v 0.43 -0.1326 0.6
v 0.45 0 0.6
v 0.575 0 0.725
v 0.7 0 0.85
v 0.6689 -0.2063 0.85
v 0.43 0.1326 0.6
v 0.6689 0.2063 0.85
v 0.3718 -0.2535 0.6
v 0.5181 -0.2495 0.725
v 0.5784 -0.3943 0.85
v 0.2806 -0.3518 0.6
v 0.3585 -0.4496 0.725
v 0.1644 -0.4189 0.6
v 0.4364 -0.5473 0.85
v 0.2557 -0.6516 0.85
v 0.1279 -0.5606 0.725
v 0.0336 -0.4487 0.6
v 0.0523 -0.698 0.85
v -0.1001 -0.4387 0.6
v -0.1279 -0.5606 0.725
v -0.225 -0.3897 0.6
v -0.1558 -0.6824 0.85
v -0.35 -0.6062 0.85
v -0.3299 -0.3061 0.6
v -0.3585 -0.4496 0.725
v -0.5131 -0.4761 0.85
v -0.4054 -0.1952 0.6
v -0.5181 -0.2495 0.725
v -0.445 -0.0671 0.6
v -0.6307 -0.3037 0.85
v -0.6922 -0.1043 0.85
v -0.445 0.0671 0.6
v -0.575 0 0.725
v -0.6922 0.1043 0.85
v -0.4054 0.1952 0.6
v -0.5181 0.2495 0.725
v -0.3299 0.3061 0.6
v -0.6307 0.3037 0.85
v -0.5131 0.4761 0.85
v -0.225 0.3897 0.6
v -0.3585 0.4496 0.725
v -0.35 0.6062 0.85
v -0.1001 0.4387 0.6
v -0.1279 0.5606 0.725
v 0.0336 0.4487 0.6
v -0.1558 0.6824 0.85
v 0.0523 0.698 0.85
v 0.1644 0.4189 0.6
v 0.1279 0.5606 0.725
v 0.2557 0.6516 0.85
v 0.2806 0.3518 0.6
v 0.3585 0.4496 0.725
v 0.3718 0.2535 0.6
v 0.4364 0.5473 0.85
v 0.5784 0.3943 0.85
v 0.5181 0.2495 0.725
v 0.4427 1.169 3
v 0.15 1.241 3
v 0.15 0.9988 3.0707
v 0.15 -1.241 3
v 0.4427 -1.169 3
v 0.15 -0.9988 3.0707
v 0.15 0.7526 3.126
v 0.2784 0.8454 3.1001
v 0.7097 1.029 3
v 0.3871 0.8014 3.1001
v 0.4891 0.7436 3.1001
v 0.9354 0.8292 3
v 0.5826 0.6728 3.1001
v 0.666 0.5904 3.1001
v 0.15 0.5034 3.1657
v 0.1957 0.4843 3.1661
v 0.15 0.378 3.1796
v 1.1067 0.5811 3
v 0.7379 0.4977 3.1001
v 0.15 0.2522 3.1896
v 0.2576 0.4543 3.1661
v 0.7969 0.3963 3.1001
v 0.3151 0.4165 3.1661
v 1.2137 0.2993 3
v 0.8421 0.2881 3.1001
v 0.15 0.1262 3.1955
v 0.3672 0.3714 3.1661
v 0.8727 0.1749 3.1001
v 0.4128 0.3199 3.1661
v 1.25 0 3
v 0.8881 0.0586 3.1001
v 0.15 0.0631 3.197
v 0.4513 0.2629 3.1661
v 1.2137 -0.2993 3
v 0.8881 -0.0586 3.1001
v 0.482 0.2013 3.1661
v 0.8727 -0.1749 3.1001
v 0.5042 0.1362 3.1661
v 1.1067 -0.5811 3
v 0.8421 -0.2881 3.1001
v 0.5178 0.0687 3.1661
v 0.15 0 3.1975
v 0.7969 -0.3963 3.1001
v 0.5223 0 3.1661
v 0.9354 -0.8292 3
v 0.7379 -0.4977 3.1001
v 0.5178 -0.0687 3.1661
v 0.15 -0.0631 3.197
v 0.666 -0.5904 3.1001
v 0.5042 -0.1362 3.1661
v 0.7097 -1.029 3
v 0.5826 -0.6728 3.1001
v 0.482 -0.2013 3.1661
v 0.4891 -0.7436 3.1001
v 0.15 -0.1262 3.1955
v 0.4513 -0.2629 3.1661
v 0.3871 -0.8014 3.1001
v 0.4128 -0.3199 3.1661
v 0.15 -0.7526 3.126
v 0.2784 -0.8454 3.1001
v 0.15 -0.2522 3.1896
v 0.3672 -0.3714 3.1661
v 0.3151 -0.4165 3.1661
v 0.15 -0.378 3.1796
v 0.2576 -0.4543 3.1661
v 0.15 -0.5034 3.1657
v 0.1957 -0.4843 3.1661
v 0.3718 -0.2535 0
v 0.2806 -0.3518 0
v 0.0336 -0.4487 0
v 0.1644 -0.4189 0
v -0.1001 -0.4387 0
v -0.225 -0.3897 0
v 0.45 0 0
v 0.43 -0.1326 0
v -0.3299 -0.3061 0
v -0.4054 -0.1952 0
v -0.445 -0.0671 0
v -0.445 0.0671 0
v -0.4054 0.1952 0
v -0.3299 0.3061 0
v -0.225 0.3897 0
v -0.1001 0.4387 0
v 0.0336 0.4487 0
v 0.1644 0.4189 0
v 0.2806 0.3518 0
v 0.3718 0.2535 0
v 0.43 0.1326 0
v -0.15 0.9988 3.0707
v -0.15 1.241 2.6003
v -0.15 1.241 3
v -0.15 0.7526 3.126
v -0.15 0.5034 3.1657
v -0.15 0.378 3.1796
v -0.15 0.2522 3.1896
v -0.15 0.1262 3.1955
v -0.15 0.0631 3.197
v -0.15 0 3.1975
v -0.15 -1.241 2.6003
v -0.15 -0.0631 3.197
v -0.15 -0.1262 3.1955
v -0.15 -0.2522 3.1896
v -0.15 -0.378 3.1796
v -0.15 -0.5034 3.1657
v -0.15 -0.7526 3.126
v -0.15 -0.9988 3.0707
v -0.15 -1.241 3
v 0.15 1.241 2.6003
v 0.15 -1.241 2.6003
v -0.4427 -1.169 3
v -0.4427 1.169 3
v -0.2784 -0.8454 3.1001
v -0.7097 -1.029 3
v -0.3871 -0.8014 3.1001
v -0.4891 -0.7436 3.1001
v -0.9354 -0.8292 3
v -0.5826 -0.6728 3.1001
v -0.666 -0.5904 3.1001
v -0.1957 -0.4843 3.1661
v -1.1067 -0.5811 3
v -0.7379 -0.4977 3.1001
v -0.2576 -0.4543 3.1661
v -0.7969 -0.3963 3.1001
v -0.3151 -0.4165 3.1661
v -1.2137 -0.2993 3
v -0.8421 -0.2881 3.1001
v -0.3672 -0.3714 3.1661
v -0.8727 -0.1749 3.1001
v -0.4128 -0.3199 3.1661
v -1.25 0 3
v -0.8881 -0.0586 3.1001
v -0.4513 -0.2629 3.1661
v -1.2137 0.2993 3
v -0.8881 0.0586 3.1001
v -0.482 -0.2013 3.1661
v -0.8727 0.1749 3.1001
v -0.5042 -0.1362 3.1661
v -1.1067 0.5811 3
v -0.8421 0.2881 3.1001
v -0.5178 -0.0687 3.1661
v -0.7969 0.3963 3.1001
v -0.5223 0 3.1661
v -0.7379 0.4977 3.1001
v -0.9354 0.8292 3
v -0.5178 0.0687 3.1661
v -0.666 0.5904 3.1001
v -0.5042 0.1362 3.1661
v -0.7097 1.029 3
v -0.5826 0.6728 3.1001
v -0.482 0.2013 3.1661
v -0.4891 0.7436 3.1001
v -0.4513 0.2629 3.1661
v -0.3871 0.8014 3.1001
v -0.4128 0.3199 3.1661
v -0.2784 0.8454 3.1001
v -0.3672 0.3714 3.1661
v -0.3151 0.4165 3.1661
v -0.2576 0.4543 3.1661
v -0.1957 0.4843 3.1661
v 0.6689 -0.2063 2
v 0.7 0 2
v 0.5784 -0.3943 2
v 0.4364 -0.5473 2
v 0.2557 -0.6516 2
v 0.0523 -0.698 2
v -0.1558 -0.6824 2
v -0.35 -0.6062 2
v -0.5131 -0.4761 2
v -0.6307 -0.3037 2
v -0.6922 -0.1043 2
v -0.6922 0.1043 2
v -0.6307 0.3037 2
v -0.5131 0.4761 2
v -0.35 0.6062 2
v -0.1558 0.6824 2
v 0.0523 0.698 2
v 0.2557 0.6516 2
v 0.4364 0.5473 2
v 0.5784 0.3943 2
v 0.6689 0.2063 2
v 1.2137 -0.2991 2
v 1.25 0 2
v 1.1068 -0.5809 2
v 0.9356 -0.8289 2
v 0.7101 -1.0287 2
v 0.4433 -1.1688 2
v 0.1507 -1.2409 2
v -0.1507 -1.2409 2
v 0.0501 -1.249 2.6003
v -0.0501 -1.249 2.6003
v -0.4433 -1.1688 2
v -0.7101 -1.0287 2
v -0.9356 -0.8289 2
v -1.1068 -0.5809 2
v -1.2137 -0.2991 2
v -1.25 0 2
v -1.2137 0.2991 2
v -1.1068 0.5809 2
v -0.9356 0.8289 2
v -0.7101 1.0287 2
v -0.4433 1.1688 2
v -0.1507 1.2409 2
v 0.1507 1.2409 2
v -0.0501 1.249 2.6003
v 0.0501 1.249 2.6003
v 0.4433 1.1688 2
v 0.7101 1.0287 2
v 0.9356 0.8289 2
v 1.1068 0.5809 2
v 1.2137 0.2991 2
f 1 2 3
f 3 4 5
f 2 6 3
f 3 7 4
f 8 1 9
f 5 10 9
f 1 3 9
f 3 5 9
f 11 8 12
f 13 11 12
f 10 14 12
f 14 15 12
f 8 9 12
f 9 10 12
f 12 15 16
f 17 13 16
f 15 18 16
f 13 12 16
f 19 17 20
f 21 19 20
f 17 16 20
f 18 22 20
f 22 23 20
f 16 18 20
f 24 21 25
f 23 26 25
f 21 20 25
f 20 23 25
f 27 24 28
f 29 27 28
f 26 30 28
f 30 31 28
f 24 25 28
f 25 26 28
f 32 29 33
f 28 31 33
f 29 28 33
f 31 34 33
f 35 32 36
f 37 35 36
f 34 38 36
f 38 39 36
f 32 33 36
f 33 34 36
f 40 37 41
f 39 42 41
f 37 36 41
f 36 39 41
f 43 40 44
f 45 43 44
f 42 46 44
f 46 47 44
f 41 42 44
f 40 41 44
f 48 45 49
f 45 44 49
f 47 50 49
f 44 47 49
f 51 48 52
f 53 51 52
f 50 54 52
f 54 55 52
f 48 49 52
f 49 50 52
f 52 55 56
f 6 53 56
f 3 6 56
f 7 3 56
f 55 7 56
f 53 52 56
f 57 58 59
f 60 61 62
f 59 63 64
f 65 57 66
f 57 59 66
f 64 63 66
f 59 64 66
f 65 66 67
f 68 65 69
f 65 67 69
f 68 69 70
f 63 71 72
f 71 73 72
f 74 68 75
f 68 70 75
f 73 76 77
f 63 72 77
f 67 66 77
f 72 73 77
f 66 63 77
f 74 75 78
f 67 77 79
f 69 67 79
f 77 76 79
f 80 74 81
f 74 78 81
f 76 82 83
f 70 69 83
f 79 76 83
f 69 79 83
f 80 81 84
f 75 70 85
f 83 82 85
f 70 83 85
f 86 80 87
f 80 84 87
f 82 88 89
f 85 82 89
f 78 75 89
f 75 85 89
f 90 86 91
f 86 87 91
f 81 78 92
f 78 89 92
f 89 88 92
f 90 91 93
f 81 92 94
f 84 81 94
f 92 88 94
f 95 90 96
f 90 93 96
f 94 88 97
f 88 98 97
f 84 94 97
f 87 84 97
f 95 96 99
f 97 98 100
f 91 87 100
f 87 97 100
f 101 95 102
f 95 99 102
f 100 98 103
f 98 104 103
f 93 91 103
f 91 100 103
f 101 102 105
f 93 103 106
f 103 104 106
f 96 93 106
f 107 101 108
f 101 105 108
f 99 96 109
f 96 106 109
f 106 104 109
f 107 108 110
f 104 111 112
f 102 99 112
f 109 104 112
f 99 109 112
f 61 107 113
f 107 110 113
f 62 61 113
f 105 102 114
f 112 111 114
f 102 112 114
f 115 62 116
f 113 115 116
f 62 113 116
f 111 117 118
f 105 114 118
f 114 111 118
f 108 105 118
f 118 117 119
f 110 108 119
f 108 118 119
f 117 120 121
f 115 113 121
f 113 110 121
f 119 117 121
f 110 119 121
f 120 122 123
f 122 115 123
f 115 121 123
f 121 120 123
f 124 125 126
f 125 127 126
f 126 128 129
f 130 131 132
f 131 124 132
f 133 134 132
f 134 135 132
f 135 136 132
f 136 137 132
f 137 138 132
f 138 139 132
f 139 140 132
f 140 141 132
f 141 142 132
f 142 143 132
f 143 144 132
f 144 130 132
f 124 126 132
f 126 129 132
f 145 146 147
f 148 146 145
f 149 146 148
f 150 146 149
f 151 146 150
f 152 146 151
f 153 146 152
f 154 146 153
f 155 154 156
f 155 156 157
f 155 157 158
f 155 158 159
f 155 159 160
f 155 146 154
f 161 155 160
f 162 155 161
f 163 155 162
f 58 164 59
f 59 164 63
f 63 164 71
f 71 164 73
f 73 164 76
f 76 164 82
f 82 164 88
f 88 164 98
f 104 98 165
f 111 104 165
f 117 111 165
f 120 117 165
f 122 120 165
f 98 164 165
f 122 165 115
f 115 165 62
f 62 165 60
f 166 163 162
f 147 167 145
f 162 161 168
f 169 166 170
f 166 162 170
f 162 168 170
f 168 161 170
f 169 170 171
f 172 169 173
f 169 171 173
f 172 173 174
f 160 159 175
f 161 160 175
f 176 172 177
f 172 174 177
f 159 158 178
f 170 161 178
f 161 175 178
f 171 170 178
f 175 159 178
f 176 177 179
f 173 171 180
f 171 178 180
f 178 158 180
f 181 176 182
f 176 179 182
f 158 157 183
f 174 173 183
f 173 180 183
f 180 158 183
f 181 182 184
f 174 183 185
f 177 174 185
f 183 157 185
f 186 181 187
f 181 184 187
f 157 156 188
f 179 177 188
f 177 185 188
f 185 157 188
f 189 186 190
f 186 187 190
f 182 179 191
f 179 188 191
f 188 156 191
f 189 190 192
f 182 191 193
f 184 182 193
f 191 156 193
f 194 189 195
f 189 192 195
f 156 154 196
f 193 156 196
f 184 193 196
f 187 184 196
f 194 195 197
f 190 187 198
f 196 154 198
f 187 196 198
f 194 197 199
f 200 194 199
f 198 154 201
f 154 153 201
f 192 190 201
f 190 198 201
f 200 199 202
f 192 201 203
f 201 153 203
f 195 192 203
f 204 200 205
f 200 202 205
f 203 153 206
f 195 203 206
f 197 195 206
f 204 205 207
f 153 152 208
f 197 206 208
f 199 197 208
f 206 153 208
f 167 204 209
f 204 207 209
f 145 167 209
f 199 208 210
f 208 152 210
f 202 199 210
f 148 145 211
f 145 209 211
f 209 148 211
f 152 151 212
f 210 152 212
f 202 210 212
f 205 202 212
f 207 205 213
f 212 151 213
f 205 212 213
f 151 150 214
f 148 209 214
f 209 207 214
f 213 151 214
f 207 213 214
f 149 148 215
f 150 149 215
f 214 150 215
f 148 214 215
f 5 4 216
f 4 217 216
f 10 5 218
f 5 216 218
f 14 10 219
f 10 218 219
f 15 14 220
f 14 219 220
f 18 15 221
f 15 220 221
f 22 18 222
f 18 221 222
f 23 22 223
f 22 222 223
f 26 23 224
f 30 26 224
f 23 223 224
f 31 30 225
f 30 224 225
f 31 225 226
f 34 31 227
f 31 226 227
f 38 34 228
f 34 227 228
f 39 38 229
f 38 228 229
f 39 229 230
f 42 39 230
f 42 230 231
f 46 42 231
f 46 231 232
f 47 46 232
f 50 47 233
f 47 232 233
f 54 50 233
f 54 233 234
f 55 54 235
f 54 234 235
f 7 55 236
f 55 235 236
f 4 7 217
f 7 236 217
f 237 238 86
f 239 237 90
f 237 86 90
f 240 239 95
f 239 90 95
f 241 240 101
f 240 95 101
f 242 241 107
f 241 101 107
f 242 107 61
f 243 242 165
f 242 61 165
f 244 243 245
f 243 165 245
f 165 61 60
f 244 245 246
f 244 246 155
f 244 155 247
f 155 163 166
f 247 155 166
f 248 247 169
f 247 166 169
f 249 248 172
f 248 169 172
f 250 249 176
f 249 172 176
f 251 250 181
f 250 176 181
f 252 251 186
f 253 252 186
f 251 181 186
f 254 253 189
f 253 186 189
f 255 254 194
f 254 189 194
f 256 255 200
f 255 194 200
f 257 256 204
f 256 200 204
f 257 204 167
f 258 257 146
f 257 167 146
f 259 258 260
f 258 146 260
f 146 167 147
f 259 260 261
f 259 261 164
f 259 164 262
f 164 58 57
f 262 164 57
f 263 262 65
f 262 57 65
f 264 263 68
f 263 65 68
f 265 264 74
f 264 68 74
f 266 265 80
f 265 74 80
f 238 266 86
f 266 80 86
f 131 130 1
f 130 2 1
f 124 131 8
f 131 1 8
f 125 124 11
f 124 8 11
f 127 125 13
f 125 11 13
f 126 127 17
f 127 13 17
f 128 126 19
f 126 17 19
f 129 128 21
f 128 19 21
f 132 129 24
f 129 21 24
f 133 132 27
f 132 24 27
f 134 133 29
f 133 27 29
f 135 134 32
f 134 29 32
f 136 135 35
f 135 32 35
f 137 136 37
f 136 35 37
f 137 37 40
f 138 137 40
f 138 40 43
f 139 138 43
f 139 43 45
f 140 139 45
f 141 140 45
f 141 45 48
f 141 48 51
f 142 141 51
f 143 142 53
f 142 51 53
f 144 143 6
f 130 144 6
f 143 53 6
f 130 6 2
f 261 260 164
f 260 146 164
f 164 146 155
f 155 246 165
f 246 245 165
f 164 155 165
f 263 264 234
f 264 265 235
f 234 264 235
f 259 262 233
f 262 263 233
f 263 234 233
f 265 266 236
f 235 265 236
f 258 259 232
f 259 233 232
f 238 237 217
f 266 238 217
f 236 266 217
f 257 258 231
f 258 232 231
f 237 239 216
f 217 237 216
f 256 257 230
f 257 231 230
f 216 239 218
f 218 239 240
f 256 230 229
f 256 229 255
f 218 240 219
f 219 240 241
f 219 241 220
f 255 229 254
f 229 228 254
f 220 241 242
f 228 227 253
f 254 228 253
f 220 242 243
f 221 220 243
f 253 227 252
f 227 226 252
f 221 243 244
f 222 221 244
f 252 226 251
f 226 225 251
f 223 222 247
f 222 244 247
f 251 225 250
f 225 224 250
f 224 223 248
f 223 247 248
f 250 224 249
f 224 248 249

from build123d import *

# Parameters (mm, degrees)
F2_W     = 0.3
F2_H     = 0.65
F3_DEPTH = 12.5


with BuildPart() as f1:
    # F0 (on Front) → F1 (revolve)
    with BuildSketch(Plane.XZ):
        Polygon((0, 3), (0, 0), (0.45, 0), (0.45, 0.6), (0.7, 0.85), (0.7, 2), (1.25, 2), (1.25, 3), align=None)
        with BuildLine():
            Line((0, 3.2003289616), (0, 3))
            Line((0, 3), (1.25, 3))
            ThreePointArc((1.25, 3), (0.6329754523, 3.1499292043), (0, 3.2003289616))
        make_face()
    revolve(axis=Axis((0, 0, 1.5), (0, 0, -1)))

    # F2 (on Front) → F3 (cut, symmetric)
    with BuildSketch(Plane.XZ):
        with Locations((0, 2.9253289616)):
            Rectangle(F2_W, F2_H)
    extrude(amount=F3_DEPTH, both=True, mode=Mode.SUBTRACT)


solid = f1.part
